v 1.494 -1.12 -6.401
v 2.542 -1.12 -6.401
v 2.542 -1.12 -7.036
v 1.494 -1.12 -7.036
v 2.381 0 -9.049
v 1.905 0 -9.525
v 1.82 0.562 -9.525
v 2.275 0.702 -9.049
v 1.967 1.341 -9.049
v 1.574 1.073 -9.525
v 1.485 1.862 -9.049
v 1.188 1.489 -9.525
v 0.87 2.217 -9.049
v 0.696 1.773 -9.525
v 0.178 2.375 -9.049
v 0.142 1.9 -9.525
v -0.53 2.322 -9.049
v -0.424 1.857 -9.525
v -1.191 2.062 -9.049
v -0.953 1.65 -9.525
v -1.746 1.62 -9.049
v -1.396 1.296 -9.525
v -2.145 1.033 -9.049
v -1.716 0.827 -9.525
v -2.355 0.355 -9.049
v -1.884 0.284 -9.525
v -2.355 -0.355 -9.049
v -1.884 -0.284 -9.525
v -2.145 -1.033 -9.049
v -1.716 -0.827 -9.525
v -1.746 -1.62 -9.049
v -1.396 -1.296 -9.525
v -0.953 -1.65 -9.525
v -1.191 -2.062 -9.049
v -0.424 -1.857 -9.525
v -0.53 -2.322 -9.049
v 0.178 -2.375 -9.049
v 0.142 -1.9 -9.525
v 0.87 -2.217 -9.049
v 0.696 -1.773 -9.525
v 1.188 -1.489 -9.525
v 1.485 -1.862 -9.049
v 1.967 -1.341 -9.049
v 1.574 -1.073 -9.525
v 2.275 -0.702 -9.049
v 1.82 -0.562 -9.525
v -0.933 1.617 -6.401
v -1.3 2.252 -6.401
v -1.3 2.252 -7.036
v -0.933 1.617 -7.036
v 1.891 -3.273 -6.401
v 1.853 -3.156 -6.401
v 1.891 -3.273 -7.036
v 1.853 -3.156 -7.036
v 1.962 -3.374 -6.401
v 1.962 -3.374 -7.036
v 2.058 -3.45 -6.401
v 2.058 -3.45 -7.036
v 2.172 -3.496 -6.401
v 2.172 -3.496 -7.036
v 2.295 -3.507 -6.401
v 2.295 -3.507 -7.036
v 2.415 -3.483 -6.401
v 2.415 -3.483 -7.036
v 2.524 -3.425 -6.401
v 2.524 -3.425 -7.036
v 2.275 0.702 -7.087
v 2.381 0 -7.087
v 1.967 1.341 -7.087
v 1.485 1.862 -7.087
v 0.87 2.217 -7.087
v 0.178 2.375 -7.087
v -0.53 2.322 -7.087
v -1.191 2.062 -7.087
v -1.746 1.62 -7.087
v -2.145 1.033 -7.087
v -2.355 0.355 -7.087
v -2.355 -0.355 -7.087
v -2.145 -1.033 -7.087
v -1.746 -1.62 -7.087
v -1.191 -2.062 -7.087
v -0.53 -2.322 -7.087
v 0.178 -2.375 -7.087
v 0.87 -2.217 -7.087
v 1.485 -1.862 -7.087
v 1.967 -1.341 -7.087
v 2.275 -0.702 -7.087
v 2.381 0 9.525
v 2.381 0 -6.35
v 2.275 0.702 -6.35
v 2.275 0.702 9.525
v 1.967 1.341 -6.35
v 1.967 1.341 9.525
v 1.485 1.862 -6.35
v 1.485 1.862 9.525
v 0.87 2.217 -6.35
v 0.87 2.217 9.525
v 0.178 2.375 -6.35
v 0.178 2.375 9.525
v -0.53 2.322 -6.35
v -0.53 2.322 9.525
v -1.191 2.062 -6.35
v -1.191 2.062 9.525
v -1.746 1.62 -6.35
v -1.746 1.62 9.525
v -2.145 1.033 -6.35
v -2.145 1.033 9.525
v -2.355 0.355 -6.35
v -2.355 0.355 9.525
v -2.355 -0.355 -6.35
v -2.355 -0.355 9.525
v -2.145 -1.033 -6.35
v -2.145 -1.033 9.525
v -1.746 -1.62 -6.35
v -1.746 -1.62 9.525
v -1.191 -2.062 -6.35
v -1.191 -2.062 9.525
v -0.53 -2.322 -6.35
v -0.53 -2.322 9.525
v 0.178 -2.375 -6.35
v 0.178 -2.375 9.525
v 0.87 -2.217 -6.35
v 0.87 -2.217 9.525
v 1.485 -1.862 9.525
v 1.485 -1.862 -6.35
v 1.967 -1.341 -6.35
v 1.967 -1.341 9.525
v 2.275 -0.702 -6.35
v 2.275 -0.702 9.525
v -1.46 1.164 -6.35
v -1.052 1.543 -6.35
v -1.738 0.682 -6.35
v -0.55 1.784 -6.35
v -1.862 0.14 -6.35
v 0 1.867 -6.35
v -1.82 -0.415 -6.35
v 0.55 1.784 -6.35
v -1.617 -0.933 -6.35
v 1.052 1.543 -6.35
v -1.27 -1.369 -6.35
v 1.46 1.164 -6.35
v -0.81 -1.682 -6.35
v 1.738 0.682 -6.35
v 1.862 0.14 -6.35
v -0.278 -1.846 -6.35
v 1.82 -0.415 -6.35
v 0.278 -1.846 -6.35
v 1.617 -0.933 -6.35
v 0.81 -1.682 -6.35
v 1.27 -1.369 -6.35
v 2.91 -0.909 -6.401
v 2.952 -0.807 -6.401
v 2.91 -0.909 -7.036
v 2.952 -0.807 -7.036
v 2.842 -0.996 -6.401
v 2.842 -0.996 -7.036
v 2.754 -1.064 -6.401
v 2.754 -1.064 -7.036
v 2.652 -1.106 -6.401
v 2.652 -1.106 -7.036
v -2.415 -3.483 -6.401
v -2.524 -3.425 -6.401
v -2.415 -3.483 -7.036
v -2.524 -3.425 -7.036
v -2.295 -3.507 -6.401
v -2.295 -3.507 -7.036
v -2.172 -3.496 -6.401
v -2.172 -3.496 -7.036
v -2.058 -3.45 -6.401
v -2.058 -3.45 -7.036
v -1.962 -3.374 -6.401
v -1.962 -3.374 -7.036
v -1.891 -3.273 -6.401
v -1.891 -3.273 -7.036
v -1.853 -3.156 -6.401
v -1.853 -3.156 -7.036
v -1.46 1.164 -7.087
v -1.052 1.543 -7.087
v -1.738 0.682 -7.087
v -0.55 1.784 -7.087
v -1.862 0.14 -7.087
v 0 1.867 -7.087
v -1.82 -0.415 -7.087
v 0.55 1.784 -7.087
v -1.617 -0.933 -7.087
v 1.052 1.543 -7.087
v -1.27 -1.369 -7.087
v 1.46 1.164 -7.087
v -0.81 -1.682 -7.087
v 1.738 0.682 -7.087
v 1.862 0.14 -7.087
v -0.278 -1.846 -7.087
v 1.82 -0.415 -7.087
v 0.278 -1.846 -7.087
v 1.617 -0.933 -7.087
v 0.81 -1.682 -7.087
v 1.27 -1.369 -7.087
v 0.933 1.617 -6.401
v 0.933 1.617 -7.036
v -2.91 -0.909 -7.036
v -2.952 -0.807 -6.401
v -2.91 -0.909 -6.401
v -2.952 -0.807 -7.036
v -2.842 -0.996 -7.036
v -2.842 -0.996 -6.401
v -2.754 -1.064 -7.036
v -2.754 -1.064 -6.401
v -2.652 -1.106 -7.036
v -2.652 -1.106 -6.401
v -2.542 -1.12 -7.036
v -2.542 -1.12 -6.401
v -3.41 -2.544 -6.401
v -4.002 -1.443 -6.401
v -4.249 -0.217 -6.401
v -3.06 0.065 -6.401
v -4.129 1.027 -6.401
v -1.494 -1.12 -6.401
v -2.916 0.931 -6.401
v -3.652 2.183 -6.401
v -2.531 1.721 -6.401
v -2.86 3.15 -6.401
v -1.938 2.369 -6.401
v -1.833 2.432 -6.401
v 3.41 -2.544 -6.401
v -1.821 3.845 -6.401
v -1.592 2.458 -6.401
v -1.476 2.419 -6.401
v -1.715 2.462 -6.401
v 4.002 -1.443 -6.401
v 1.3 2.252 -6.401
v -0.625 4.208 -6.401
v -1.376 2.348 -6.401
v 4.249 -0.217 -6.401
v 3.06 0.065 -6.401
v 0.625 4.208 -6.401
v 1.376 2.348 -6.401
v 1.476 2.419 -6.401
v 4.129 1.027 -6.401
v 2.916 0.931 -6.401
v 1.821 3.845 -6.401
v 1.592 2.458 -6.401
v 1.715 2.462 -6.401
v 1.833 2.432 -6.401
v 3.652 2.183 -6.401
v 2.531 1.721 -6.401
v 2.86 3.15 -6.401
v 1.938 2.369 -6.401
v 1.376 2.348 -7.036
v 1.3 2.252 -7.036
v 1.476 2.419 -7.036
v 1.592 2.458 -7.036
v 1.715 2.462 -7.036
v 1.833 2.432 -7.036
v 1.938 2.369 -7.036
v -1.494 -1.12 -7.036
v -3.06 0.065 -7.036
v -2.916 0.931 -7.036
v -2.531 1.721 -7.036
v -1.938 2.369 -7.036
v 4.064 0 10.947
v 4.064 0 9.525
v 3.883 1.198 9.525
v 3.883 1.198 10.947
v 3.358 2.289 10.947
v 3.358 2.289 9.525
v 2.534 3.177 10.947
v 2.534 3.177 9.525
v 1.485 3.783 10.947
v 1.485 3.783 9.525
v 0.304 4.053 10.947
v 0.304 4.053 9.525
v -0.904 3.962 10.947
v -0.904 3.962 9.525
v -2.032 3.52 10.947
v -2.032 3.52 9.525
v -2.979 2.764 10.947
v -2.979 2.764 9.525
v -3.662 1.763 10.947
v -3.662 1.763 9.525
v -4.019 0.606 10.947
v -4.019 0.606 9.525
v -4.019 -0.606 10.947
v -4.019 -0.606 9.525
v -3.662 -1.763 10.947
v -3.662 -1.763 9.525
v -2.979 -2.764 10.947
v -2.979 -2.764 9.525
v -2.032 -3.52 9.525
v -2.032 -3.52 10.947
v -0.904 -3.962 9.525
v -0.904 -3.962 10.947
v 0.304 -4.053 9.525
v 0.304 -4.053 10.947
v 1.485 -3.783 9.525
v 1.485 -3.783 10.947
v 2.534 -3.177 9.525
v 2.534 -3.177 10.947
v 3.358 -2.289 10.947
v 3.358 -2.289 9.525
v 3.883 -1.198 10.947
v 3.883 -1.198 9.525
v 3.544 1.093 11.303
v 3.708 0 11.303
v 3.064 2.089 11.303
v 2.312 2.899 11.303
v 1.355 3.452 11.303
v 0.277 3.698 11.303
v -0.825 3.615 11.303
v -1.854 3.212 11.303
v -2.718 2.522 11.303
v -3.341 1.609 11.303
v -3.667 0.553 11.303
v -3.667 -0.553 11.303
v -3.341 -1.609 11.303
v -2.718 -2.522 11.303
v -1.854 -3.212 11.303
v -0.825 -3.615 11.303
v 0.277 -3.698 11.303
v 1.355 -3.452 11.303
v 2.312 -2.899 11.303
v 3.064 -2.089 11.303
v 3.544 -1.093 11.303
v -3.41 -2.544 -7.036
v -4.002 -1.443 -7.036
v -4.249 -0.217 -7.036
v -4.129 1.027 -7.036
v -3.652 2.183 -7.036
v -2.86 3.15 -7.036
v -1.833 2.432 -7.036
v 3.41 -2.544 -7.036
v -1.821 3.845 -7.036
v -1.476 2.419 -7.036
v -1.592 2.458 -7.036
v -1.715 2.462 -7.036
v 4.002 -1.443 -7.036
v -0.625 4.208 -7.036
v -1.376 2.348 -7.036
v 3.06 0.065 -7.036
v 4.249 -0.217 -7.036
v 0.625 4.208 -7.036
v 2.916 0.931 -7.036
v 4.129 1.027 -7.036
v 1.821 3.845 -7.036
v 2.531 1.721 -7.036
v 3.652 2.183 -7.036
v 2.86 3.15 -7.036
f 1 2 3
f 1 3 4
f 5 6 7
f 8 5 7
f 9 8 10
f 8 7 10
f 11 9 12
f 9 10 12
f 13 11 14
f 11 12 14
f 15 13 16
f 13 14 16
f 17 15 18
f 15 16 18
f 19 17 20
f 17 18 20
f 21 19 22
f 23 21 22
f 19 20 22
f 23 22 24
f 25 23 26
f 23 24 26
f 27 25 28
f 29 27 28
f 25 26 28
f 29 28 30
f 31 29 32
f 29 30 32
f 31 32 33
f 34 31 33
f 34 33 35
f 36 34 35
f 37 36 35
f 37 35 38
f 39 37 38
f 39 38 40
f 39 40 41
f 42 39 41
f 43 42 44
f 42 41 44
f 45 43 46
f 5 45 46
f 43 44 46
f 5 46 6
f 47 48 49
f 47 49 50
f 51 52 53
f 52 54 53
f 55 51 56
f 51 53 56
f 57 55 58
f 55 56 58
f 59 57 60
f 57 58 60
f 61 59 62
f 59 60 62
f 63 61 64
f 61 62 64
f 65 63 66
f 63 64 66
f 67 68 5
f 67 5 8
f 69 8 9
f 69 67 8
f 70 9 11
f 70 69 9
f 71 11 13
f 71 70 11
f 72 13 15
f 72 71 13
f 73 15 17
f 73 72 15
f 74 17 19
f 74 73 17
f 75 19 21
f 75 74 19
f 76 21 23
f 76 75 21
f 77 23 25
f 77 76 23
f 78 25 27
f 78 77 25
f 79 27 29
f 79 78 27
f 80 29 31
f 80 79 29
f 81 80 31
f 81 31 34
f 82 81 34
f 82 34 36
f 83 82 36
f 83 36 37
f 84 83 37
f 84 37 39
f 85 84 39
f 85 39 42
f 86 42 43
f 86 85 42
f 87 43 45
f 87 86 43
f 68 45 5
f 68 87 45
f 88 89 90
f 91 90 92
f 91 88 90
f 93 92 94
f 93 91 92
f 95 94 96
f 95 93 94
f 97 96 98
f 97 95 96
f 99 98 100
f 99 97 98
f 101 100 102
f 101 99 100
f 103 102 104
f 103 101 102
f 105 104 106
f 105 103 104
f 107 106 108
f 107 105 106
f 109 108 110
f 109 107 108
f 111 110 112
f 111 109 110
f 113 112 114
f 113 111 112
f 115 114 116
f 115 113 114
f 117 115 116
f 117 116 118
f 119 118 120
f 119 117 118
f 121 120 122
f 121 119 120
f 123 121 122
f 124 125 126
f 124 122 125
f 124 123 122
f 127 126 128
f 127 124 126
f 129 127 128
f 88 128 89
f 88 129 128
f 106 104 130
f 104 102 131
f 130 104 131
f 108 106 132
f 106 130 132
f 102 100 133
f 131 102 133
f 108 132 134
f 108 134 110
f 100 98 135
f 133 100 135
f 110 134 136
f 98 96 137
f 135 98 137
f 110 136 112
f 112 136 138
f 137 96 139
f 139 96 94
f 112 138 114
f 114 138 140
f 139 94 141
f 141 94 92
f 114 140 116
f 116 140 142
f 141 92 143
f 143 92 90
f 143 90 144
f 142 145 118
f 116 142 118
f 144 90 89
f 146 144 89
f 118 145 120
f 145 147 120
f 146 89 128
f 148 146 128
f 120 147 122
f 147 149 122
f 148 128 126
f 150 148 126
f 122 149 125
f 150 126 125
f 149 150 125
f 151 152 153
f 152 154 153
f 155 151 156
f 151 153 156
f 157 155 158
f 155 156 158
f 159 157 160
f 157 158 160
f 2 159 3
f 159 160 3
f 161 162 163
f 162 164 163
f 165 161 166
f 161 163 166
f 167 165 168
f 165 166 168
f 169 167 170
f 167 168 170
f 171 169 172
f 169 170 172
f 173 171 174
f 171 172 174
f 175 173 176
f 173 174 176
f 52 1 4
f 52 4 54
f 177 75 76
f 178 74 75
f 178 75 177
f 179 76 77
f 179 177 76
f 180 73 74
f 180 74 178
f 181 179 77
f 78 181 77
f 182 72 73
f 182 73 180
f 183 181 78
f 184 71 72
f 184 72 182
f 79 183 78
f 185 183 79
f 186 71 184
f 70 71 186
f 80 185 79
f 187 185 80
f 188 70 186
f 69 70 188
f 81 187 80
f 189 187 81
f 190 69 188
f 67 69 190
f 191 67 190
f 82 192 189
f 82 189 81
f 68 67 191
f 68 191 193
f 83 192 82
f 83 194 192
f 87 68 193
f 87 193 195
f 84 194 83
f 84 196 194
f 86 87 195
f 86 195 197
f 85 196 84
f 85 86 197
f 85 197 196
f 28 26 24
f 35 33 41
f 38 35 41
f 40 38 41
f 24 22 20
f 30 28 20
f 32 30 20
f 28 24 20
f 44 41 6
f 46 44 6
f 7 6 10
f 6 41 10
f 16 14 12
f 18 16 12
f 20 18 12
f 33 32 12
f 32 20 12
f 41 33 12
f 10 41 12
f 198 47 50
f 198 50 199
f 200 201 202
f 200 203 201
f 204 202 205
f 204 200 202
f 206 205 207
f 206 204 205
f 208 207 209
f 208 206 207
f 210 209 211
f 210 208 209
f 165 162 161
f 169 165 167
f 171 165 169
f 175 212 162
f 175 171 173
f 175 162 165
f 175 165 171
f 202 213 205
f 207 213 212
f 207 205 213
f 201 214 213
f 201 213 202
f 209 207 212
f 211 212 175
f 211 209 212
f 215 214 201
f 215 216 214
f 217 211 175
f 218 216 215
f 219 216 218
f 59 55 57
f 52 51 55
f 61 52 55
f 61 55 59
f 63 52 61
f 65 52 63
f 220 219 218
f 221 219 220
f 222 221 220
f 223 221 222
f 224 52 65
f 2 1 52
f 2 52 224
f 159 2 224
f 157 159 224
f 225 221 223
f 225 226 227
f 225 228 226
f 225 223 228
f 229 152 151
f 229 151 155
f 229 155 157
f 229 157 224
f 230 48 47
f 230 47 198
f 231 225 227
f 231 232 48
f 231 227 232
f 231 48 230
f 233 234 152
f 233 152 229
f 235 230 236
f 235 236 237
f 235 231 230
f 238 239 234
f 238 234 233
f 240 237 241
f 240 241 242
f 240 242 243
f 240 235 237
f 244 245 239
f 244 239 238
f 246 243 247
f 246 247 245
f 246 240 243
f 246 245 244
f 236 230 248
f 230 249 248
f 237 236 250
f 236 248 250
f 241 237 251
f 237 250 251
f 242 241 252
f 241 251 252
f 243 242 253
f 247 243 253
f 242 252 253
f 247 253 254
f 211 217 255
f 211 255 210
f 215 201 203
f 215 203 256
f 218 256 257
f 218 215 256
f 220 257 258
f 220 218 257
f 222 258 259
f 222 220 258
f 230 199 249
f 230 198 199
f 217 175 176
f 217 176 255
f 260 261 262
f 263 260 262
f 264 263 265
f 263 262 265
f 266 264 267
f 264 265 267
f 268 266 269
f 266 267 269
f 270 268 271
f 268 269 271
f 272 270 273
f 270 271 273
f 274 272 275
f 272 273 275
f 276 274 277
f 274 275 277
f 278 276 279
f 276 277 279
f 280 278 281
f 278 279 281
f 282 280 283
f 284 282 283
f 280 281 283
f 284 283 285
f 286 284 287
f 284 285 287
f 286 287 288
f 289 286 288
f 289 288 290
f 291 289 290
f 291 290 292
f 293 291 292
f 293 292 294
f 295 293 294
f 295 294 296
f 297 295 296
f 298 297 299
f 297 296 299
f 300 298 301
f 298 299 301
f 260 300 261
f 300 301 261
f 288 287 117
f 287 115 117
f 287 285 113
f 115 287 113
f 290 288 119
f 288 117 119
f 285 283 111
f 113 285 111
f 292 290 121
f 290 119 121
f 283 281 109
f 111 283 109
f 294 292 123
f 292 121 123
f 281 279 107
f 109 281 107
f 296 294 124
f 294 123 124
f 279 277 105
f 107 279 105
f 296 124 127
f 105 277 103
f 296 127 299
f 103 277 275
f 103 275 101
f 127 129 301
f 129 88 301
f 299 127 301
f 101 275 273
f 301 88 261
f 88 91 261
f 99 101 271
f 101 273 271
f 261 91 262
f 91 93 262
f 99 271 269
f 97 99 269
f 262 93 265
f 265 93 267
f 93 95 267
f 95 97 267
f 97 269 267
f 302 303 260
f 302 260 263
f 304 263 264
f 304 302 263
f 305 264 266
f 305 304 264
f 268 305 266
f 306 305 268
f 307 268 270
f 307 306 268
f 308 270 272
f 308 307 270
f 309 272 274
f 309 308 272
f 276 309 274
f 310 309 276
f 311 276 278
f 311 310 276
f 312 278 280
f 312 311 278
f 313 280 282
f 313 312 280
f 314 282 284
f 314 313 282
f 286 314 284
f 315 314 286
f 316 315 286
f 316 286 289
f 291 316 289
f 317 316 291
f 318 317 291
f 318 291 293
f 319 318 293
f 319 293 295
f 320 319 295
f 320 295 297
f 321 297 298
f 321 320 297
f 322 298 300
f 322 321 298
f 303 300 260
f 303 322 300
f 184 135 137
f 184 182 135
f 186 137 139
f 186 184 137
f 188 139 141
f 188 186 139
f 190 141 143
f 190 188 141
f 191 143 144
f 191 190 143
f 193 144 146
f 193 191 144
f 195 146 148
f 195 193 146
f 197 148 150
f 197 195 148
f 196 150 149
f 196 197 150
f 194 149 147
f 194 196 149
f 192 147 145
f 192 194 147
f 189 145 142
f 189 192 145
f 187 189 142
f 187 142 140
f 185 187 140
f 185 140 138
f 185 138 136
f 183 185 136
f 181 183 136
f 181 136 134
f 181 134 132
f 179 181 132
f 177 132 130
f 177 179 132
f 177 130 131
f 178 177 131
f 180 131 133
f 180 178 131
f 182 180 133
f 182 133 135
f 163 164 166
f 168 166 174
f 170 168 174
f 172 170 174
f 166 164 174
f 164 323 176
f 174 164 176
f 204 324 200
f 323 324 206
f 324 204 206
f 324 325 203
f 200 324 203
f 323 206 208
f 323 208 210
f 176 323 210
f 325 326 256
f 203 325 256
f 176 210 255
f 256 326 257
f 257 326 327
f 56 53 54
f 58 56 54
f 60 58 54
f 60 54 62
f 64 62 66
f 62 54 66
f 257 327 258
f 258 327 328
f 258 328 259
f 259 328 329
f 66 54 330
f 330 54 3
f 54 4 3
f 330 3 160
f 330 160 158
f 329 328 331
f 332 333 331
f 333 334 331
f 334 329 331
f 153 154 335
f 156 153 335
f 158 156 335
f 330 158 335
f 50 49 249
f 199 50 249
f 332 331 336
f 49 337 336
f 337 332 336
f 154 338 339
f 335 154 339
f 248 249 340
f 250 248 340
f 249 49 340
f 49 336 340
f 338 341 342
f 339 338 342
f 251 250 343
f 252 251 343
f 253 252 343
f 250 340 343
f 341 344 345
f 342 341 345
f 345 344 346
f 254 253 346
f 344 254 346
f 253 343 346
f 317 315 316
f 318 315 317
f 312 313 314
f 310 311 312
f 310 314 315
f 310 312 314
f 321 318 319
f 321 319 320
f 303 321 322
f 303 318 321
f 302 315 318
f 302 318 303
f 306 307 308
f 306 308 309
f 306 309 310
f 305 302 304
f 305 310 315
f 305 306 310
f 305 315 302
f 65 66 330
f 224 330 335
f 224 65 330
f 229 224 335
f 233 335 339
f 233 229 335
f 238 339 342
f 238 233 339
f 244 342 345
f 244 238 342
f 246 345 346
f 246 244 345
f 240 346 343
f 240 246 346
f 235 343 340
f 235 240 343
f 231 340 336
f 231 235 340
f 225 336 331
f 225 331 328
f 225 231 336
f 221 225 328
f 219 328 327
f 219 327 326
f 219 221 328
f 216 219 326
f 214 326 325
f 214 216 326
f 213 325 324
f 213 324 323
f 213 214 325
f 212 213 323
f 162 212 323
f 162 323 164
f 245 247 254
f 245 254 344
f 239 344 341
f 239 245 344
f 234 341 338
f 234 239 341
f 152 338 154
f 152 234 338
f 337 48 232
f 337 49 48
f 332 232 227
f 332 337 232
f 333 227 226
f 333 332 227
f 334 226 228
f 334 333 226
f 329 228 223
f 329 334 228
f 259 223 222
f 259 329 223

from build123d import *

# Parameters (mm, degrees)
SKETCH2_R      = 2.38125
EXTRUDE1_DEPTH = 9.525
SKETCH3_W      = 0.7366
SKETCH3_H      = 0.51435
SKETCH8_R      = 4.064
EXTRUDE6_DEPTH = 1.778
CHAMFER2_SIZE  = 0.3556
SKETCH4_R      = 4.2545
SKETCH4_R_2    = 1.8669
EXTRUDE2_DEPTH = 0.3175
EXTRUDE4_DEPTH = 10.525
EXTRUDE5_DEPTH = 0.635
FILLET1_R      = 0.42545
CHAMFER1_SIZE  = 0.47625


with BuildPart() as part:
    # Sketch2 → Extrude1 (new body, symmetric)
    with BuildSketch(Plane.XY):
        Circle(SKETCH2_R)
    extrude(amount=EXTRUDE1_DEPTH, both=True)

    # Sketch3 → Cut-Revolve1 (revolve, cut)
    with BuildSketch(Plane(origin=(0, 0, 0), x_dir=(0, 0, -1), z_dir=(1, 0, 0))):
        with Locations((6.7183, 2.124075)):
            Rectangle(SKETCH3_W, SKETCH3_H)
    revolve(axis=Axis((0, 0, 9.525), (0, 0, -1)), mode=Mode.SUBTRACT)

    # Sketch8 → Extrude6 (add)
    with BuildSketch(Plane.XY.offset(9.525)):
        Circle(SKETCH8_R)
    extrude(amount=EXTRUDE6_DEPTH)

    # Chamfer2
    chamfer2_edges = [part.edges().sort_by_distance(p)[0] for p in [
        (-4.064, 0, 11.303),
    ]]
    chamfer(chamfer2_edges, length=CHAMFER2_SIZE)

    # Chamfer1
    chamfer1_edges = [part.edges().sort_by_distance(p)[0] for p in [
        (-2.38125, 0, -9.525),
    ]]
    chamfer(chamfer1_edges, length=CHAMFER1_SIZE)


with BuildPart() as body_2:
    # Sketch4 → Extrude2 (new body, symmetric)
    with BuildSketch(Plane.XY.offset(-6.7183)):
        Circle(SKETCH4_R)
        Circle(SKETCH4_R_2, mode=Mode.SUBTRACT)
    extrude(amount=EXTRUDE2_DEPTH, both=True)

    # Sketch5 → Extrude4 (cut, through all)
    with BuildSketch(Plane.XY):
        with BuildLine():
            Line((-1.53035, 2.650643953), (0, 0))
            Line((0, 0), (1.53035, 2.650643953))
            ThreePointArc((1.53035, 2.650643953), (2.889287878, 1.00990101), (2.84836284, -1.12014))
            Line((2.84836284, -1.12014), (1.49352, -1.12014))
            Line((1.49352, -1.12014), (1.96168838, -3.775254819))
            ThreePointArc((1.96168838, -3.775254819), (0, -4.2545), (-1.96168838, -3.775254819))
            Line((-1.96168838, -3.775254819), (-1.49352, -1.12014))
            Line((-1.49352, -1.12014), (-2.84836284, -1.12014))
            ThreePointArc((-2.84836284, -1.12014), (-2.889287878, 1.00990101), (-1.53035, 2.650643953))
        make_face()
    extrude(amount=-EXTRUDE4_DEPTH, mode=Mode.SUBTRACT)

    # Sketch6 → Extrude5 (add)
    with BuildSketch(Plane.XY.offset(-6.4008)):
        with BuildLine():
            Line((-0.93345, 1.616782826), (0.93345, 1.616782826))
            ThreePointArc((0.93345, 1.616782826), (0, 1.8669), (-0.93345, 1.616782826))
        make_face()
    extrude(amount=-EXTRUDE5_DEPTH)

    # Fillet1
    fillet1_edges = [body_2.edges().sort_by_distance(p)[0] for p in [
        (1.53035, 2.650643953, -6.7183),
        (1.96168838, -3.775254819, -6.7183),
        (-2.84836284, -1.12014, -6.7183),
        (2.84836284, -1.12014, -6.7183),
        (-1.96168838, -3.775254819, -6.7183),
        (-1.53035, 2.650643953, -6.7183),
    ]]
    fillet(fillet1_edges, radius=FILLET1_R)


solid = Compound([part.part, body_2.part])
